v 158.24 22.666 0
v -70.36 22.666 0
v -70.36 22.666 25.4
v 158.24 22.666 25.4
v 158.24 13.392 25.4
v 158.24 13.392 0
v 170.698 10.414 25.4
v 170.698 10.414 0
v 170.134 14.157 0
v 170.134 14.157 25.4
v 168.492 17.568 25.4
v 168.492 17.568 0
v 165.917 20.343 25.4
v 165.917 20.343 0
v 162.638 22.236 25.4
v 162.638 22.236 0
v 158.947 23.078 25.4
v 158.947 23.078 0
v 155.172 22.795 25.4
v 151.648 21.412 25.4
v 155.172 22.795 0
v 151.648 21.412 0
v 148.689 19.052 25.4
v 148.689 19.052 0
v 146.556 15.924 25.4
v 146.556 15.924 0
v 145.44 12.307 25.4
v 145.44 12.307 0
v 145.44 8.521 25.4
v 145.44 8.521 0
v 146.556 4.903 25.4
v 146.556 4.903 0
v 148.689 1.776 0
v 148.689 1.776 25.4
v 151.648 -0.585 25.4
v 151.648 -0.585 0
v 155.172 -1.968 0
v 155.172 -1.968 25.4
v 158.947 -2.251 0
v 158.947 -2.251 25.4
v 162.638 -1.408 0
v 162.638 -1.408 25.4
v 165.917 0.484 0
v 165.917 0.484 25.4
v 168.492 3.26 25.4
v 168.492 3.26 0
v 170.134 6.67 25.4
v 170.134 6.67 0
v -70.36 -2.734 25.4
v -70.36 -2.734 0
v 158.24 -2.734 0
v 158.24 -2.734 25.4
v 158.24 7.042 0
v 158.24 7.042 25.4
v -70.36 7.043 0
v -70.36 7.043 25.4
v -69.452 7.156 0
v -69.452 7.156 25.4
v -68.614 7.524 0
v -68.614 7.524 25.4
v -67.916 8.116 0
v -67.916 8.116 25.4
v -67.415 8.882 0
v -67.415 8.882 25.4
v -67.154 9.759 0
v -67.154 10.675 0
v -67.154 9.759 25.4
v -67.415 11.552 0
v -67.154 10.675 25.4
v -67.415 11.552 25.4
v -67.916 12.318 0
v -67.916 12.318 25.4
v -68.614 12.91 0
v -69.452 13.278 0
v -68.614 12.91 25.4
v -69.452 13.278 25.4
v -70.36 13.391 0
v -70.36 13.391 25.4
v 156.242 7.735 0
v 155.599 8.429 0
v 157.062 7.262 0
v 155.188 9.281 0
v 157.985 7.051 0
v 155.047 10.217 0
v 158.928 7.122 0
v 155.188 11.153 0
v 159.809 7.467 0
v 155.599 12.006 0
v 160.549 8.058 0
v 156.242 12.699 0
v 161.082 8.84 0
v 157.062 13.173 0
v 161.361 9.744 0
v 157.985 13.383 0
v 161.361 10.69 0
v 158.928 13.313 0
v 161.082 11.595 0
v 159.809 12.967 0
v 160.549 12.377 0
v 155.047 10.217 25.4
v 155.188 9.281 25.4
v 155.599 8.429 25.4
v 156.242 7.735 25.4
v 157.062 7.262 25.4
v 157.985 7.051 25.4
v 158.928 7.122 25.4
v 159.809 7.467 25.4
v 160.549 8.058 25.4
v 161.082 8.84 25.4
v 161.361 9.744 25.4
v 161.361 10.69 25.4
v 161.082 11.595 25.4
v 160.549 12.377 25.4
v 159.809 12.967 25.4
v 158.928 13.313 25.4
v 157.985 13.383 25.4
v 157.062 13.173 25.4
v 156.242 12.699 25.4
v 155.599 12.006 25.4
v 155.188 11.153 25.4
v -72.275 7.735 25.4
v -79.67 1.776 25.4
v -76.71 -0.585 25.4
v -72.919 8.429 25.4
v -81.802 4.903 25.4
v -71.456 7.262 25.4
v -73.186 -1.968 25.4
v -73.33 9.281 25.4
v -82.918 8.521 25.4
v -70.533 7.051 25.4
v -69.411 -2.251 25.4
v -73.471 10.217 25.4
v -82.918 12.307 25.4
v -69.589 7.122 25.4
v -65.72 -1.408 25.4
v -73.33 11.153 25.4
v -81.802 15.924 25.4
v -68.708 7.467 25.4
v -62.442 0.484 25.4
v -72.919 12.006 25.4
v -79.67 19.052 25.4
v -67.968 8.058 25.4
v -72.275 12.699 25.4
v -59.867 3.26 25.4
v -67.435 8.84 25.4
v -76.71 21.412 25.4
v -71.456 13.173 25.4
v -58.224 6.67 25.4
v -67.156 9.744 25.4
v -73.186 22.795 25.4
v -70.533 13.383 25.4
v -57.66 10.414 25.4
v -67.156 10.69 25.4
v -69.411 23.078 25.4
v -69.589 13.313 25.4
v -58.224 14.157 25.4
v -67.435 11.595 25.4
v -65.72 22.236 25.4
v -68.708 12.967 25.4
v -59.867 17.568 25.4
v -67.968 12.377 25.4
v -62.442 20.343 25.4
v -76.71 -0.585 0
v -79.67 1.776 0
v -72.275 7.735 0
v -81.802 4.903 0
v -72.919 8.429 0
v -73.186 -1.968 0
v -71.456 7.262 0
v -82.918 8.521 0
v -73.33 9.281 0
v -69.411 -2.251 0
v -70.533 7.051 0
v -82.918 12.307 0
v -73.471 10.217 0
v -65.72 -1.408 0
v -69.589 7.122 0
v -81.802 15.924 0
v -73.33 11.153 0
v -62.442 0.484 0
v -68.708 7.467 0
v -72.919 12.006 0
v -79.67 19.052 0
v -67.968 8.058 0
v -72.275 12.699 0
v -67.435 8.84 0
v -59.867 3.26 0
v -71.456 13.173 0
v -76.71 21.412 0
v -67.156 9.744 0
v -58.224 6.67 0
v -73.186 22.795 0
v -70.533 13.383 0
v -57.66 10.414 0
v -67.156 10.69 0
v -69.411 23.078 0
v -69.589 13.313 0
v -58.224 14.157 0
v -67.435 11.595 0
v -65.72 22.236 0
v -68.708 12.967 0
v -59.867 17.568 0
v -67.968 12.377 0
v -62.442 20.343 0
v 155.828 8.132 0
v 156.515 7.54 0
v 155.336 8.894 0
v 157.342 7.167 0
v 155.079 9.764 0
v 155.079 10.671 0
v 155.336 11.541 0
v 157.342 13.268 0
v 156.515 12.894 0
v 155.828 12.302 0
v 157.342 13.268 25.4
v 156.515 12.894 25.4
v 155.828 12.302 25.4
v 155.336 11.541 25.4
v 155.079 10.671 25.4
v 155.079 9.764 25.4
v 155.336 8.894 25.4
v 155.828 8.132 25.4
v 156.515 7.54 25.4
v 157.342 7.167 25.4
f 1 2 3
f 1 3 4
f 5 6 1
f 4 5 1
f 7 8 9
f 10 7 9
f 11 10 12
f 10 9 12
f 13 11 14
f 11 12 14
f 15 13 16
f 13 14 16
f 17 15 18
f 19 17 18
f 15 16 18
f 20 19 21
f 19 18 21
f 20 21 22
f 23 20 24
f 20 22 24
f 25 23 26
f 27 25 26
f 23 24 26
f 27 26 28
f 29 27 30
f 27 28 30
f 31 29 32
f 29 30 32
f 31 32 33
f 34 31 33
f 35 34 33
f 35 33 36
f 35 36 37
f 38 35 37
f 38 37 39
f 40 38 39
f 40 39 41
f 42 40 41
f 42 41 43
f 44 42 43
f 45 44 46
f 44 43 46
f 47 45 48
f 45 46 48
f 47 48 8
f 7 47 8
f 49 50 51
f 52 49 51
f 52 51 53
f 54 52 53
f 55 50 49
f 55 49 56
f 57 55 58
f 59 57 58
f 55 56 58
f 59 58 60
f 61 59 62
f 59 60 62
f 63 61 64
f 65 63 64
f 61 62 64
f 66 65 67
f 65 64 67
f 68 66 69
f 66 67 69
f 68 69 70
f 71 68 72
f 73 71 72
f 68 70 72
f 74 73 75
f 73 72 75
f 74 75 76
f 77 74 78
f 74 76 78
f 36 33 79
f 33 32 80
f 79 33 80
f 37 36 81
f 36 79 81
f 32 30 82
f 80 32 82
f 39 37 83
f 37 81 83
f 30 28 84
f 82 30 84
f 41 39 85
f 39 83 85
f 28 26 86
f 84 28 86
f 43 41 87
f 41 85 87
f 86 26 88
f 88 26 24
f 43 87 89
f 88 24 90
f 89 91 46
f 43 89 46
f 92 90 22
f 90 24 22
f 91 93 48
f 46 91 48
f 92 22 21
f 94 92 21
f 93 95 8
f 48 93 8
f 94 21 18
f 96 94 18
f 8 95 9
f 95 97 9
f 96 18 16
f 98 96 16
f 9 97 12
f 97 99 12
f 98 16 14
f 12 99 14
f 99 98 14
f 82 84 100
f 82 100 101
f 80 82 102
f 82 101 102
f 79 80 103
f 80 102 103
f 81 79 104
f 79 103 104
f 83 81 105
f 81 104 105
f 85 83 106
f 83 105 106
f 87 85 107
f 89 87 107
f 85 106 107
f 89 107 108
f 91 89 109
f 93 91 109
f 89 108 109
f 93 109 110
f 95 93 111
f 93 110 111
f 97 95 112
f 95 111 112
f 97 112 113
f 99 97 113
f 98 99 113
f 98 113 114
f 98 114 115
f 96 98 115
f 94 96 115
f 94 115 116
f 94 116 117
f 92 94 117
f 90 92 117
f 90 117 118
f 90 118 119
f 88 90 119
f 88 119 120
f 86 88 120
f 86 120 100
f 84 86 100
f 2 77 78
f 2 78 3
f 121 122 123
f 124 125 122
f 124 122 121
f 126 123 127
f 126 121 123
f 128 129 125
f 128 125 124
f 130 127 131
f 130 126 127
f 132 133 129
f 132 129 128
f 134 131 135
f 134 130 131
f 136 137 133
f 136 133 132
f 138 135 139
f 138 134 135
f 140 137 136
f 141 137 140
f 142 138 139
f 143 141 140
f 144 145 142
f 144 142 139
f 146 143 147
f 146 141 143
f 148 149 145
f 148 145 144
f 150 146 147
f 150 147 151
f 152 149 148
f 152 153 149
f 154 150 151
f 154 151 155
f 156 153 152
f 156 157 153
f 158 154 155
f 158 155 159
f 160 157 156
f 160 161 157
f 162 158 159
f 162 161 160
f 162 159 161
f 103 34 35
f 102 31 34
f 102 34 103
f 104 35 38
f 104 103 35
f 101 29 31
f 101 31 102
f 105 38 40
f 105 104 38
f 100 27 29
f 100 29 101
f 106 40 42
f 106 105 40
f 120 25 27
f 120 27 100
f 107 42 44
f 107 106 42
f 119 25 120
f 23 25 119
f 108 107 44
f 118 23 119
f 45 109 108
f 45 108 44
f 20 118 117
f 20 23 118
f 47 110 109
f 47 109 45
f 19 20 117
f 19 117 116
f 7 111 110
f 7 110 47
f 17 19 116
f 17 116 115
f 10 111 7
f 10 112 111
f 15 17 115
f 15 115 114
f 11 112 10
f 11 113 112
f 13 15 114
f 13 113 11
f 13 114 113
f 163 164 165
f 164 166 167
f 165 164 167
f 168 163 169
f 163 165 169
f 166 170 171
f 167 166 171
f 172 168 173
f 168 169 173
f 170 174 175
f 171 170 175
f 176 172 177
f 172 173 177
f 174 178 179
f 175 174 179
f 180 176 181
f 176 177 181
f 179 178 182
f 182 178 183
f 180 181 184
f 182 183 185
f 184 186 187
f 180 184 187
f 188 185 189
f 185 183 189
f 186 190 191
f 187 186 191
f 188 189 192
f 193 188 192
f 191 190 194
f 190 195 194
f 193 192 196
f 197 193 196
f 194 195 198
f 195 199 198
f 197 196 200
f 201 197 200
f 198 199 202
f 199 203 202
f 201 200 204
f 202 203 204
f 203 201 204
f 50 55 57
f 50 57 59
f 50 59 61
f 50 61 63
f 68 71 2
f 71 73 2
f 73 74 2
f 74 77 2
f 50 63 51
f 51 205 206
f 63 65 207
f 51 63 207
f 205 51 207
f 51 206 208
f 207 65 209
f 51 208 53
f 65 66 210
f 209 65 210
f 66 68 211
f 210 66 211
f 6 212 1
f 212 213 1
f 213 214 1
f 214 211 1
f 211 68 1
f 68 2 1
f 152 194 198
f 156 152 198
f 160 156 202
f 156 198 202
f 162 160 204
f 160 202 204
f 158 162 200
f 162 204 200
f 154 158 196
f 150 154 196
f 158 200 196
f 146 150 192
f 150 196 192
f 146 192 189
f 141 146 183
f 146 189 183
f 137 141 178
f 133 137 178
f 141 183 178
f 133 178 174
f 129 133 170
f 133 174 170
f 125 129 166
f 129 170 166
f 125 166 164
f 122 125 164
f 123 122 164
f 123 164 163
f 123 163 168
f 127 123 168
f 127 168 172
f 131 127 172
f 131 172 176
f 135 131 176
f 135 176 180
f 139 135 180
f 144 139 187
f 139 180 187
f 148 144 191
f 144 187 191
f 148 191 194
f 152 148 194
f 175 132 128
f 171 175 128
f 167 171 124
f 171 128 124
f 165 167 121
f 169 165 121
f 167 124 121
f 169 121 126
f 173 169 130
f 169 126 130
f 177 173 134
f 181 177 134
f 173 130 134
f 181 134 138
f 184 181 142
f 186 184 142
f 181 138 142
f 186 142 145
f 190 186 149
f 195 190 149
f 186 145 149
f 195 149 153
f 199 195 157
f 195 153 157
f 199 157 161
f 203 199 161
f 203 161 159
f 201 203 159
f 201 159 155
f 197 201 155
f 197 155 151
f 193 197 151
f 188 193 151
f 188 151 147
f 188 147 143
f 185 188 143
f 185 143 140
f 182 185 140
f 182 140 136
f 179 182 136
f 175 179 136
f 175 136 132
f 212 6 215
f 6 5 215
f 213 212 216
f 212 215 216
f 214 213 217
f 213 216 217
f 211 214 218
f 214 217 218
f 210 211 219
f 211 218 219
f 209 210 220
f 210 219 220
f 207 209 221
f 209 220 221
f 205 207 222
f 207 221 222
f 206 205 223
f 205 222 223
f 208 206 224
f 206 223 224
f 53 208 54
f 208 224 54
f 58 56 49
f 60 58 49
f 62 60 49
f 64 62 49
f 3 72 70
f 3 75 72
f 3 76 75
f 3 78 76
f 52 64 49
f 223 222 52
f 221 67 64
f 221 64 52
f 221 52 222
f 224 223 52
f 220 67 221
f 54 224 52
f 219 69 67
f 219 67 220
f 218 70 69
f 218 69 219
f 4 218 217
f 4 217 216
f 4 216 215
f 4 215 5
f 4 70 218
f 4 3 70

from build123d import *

# Parameters (mm, degrees)
F1_R     = 12.7
F2_DEPTH = 25.4
F0_W     = 228.6
F0_H     = 25.4
F4_D     = 6.35
F4_2_D   = 6.35
F6_D     = 6.35
F6_2_D   = 6.35


with BuildPart() as f2:
    # F1 (on Top) → F2 (new body)
    with BuildSketch(Plane.XY):
        with Locations((-70.3600868583, 10.4137500748)):
            Circle(F1_R)
    extrude(amount=F2_DEPTH)

    # F4 (through all)
    with Locations(Plane(origin=(0, 0, 0), x_dir=(1, 0, 0), z_dir=(0, 0, -1))):
        with Locations((-70.2958703041, -10.2171041071)):
            Hole(F4_D / 2)


with BuildPart() as f2b:
    # F1 (on Top) → F2, piece 2 (new body)
    with BuildSketch(Plane.XY):
        with Locations((157.9982936382, 10.4137500748)):
            Circle(F1_R)
    extrude(amount=F2_DEPTH)

    # F6 (through all)
    with Locations(Plane(origin=(0, 0, 0), x_dir=(1, 0, 0), z_dir=(0, 0, -1))):
        with Locations((158.2219004631, -10.2171041071)):
            Hole(F6_D / 2)


with BuildPart() as f2c:
    # F0 (on Top) → F2, piece 3 (new body)
    with BuildSketch(Plane.XY):
        with Locations((43.9399131417, 9.9658453044)):
            Rectangle(F0_W, F0_H)
    extrude(amount=F2_DEPTH)

    # F4#2 (through all)
    with Locations(Plane(origin=(0, 0, 0), x_dir=(1, 0, 0), z_dir=(0, 0, -1))):
        with Locations((-70.2958703041, -10.2171041071)):
            Hole(F4_2_D / 2)

    # F6#2 (through all)
    with Locations(Plane(origin=(0, 0, 0), x_dir=(1, 0, 0), z_dir=(0, 0, -1))):
        with Locations((158.2219004631, -10.2171041071)):
            Hole(F6_2_D / 2)


solid = Compound([f2.part, f2b.part, f2c.part])
